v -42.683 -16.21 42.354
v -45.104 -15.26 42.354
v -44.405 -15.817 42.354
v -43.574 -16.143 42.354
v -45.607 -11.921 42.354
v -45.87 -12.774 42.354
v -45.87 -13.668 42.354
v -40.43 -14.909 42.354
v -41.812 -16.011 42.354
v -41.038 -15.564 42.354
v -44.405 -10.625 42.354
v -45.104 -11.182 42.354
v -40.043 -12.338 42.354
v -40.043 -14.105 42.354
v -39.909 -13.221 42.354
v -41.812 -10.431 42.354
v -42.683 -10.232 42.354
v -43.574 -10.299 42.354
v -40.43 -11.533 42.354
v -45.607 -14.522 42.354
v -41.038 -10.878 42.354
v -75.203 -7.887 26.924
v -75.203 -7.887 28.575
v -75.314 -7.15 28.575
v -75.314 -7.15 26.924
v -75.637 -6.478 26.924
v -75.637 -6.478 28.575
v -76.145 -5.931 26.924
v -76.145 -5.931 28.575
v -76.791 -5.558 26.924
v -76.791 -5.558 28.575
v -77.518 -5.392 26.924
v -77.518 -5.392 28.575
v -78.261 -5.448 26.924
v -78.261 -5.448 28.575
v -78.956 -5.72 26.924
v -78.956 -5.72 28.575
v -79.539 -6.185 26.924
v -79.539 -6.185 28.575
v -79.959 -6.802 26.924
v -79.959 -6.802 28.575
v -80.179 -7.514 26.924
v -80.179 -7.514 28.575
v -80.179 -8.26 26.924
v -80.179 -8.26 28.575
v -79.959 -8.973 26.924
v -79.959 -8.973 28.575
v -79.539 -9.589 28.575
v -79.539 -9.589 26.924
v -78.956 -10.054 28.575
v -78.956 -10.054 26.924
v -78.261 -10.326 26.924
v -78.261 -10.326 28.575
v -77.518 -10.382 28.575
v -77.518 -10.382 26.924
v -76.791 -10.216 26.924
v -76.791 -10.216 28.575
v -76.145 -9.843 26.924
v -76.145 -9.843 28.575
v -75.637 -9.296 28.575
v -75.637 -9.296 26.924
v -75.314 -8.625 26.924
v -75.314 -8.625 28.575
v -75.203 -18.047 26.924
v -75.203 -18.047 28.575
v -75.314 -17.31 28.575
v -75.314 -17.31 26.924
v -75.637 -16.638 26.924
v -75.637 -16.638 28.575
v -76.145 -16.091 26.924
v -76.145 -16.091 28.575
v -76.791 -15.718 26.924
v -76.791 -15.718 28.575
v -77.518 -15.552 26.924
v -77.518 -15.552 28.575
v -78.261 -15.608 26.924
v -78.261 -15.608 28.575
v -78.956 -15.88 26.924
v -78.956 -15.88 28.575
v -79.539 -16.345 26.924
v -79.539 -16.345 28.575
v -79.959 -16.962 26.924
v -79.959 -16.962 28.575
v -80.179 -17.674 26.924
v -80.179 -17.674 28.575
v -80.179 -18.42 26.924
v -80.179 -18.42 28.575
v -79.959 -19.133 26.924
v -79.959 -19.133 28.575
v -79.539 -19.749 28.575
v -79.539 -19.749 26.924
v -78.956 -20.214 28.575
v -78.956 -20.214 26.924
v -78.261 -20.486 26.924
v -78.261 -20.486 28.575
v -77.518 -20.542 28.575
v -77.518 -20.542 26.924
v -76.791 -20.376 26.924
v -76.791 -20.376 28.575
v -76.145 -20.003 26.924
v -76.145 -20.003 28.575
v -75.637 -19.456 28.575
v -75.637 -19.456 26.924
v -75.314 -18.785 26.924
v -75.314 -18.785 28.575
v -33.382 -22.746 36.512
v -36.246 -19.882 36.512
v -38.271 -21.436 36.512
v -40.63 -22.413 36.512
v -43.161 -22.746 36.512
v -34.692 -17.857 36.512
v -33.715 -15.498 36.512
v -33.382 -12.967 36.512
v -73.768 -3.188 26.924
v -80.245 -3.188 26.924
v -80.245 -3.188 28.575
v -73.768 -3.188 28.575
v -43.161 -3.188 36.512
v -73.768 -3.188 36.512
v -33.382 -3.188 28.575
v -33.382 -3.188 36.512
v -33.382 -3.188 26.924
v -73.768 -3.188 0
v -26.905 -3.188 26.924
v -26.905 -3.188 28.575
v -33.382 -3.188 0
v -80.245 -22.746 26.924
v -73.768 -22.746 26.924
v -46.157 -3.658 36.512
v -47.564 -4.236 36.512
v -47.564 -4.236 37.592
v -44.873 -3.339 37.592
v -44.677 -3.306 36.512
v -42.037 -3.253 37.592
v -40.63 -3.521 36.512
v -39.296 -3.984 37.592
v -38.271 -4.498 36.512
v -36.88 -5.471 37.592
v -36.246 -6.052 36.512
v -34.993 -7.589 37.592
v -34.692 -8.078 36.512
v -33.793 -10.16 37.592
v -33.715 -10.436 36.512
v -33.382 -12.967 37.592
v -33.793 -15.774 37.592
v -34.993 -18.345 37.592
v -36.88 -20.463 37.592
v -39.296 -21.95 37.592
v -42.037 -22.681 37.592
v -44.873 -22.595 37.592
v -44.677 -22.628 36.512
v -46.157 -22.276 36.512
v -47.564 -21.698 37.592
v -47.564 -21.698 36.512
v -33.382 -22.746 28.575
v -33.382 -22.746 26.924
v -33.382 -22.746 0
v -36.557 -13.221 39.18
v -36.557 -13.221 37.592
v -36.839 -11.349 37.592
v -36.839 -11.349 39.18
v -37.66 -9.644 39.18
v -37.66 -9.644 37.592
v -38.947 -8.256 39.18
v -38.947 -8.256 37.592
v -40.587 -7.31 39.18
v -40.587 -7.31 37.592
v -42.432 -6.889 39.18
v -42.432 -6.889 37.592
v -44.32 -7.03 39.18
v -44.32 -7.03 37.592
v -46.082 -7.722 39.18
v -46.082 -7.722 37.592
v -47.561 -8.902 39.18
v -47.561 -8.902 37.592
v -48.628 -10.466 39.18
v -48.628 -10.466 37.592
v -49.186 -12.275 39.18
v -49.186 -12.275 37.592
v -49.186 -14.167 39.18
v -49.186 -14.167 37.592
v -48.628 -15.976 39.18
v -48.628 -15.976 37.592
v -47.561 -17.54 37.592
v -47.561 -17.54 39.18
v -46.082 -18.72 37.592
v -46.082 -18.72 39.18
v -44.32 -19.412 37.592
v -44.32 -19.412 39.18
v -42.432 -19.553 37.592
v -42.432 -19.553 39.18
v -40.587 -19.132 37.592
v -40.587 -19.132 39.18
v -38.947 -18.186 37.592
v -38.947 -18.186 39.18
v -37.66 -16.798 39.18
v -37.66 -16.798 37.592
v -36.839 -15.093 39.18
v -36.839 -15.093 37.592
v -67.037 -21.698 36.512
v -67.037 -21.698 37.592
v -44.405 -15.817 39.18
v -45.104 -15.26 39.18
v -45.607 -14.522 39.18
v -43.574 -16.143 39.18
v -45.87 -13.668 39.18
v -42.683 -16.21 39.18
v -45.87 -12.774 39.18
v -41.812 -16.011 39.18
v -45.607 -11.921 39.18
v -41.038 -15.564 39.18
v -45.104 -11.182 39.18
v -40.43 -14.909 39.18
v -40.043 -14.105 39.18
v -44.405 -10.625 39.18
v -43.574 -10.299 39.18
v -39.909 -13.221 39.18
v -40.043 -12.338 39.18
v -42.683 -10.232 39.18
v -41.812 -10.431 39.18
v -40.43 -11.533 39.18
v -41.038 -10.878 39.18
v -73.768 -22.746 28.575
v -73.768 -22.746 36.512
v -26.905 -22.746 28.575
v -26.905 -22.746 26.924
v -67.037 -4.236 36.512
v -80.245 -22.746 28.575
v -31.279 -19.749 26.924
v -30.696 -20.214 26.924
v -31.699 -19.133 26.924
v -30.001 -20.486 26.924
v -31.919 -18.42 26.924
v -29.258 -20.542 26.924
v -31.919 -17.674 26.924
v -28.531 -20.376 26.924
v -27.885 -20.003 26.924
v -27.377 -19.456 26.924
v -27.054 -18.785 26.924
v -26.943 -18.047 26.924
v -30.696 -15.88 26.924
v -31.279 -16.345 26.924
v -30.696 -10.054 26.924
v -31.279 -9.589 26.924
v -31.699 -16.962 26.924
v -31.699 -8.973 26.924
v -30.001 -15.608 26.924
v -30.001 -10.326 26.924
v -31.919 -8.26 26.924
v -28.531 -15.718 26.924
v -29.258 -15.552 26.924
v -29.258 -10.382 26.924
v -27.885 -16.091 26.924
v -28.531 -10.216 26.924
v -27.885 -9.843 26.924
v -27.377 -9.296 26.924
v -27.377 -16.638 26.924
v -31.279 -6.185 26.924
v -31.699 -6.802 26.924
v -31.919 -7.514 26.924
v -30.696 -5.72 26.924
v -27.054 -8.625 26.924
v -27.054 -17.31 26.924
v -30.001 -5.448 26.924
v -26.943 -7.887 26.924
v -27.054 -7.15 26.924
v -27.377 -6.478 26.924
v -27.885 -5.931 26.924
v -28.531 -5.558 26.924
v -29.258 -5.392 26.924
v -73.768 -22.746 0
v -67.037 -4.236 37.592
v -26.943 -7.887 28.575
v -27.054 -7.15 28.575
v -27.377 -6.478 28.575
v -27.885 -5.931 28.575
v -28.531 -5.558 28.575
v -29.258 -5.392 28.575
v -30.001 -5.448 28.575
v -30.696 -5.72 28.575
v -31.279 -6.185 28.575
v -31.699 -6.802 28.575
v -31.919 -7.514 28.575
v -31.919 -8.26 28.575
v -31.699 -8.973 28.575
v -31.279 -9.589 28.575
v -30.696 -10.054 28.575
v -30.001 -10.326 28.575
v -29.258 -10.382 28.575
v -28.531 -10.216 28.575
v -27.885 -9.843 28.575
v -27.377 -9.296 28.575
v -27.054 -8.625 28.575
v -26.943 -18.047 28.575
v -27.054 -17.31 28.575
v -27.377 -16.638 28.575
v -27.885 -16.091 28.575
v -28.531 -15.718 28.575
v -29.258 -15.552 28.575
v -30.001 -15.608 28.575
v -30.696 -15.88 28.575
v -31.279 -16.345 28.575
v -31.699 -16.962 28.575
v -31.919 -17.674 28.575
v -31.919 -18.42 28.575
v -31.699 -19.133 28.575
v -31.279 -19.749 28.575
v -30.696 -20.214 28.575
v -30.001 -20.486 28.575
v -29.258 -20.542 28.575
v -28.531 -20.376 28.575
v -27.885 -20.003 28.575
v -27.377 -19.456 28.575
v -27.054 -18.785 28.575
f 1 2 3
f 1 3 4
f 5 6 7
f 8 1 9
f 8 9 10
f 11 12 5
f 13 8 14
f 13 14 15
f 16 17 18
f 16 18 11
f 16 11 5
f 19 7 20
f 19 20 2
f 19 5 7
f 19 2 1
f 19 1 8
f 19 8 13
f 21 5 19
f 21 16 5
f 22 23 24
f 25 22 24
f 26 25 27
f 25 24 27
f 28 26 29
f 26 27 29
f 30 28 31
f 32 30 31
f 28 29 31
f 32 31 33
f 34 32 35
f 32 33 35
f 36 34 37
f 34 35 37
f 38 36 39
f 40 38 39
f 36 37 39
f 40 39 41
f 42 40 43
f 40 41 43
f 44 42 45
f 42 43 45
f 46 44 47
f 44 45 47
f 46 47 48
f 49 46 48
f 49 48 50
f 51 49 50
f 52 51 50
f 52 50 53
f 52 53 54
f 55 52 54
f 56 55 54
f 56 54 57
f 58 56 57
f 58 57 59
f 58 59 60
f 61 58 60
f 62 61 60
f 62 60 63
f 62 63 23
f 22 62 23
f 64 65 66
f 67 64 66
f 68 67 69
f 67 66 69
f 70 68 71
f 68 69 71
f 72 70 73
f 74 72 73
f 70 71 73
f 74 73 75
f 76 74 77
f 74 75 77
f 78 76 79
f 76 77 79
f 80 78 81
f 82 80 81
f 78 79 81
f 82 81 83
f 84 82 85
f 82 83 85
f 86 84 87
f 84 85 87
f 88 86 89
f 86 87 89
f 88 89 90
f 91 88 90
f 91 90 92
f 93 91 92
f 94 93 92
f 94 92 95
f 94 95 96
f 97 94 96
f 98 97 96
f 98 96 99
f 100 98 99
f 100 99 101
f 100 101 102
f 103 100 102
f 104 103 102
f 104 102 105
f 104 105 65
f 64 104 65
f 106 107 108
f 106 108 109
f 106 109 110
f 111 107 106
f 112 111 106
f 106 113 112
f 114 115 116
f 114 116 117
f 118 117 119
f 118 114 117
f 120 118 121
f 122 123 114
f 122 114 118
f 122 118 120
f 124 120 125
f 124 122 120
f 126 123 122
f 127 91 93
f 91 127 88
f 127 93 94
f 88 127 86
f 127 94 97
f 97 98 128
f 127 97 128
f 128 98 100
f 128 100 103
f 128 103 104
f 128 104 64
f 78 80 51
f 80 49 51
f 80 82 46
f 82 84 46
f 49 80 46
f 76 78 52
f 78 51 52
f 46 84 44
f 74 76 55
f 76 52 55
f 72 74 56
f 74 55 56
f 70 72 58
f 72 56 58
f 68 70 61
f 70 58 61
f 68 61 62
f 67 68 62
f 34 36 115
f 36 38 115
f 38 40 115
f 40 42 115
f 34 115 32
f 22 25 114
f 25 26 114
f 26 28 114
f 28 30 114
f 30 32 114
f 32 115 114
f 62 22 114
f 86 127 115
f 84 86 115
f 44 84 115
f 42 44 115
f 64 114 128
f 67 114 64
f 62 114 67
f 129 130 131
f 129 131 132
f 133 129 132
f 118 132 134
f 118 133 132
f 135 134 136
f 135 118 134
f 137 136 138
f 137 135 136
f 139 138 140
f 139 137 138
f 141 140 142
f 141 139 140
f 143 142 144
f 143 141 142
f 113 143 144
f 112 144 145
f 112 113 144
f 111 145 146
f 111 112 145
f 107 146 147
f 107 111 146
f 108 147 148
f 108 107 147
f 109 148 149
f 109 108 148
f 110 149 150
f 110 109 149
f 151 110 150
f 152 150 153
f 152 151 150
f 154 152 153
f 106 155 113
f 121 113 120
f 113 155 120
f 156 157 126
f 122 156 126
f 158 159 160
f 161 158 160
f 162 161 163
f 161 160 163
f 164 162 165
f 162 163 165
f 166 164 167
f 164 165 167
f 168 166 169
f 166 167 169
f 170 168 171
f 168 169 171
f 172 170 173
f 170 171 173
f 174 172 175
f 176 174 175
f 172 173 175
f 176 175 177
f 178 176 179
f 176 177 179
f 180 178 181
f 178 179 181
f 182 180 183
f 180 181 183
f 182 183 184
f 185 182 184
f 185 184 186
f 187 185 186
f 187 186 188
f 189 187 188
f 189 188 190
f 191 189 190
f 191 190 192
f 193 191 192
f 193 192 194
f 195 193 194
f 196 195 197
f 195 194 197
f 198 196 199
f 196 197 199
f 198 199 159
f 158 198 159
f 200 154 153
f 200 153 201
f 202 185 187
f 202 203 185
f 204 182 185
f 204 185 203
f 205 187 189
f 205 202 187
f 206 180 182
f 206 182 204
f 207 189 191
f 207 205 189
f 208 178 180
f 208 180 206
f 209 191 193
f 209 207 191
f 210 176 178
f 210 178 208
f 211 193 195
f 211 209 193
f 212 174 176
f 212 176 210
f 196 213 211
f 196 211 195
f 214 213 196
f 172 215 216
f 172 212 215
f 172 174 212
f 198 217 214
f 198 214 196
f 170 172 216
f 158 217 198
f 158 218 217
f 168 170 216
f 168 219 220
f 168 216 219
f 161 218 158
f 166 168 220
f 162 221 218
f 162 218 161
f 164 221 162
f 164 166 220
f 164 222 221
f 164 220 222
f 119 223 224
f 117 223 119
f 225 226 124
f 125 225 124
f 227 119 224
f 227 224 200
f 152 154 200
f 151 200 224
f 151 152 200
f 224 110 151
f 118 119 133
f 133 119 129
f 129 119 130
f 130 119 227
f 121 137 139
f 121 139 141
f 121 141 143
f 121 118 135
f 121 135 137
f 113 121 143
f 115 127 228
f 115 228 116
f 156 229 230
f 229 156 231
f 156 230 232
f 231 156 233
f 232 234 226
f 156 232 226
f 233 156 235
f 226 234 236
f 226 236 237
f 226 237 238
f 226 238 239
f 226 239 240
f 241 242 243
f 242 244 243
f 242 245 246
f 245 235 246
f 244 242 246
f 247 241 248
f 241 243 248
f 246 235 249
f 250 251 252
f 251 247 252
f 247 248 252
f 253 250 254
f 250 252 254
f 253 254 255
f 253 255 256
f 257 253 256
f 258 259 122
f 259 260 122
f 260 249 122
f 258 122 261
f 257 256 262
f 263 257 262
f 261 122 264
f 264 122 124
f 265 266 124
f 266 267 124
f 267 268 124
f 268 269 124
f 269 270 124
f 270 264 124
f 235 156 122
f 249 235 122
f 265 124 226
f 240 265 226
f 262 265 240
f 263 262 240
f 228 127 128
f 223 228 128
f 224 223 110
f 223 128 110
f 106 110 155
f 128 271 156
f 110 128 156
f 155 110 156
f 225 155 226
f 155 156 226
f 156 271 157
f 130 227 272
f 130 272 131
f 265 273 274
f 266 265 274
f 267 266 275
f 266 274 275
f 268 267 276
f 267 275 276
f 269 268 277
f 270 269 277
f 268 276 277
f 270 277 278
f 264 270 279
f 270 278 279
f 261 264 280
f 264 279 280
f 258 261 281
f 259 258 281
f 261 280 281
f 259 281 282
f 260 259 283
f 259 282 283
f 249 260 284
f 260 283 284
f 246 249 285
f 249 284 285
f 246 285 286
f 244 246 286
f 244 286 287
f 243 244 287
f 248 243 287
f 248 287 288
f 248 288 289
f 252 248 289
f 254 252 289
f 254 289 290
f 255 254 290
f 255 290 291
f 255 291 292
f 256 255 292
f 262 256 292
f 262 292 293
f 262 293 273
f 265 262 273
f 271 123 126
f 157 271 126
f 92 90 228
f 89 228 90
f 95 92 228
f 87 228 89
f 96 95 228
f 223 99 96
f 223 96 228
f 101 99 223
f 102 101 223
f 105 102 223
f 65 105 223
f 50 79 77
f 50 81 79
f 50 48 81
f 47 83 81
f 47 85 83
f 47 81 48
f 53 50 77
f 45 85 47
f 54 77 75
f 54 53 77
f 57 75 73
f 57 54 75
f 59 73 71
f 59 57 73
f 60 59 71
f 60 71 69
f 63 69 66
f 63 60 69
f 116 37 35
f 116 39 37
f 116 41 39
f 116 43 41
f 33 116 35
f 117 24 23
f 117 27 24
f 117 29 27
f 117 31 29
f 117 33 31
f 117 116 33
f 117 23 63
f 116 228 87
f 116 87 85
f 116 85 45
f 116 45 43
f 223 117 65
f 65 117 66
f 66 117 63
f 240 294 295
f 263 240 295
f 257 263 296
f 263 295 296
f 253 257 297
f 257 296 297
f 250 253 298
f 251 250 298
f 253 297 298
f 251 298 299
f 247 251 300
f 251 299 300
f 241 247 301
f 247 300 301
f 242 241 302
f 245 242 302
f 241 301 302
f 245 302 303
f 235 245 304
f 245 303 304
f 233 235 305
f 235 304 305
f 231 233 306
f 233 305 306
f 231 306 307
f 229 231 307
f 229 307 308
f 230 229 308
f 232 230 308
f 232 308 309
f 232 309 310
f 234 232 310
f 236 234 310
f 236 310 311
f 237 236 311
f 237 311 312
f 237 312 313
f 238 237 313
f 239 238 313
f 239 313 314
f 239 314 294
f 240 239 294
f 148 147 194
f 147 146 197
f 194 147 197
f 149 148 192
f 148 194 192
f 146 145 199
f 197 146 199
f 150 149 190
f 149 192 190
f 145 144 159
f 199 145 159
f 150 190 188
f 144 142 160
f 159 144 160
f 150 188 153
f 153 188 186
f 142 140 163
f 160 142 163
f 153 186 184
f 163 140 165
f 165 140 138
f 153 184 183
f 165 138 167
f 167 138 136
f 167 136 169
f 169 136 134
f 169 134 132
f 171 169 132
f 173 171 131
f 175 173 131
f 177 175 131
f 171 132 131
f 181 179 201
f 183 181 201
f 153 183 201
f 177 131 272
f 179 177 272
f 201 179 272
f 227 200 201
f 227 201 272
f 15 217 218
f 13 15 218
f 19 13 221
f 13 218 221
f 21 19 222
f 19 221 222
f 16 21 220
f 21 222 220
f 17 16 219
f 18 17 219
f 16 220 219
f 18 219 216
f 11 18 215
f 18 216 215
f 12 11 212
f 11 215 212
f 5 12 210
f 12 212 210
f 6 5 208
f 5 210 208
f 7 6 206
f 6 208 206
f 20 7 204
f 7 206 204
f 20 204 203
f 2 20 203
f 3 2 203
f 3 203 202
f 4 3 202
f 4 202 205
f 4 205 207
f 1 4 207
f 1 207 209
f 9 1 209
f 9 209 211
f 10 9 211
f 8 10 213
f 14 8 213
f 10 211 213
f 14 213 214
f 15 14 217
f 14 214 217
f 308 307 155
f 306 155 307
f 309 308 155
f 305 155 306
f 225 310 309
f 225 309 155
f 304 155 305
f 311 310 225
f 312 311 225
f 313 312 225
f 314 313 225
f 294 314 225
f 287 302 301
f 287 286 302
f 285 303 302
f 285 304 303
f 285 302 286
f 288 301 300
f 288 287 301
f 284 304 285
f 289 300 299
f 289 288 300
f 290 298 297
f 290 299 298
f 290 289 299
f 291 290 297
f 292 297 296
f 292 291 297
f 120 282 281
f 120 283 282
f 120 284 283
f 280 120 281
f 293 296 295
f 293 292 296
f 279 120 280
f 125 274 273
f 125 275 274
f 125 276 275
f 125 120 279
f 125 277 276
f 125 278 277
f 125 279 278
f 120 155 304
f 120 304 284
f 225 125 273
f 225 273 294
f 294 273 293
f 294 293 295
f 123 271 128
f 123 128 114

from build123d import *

# Parameters (mm, degrees)
SKETCH3_W           = 40.386
SKETCH3_H           = 19.558
BOSS_EXTRUDE2_DEPTH = 26.924
SKETCH4_W           = 53.34
SKETCH4_H           = 19.558
BOSS_EXTRUDE3_DEPTH = 1.651
SKETCH5_R           = 2.5019
CUT_EXTRUDE1_DEPTH  = 3.175
SKETCH6_W           = 40.386
SKETCH6_H           = 19.558
BOSS_EXTRUDE4_DEPTH = 7.9375
BOSS_EXTRUDE5_DEPTH = 1.0795
SKETCH8_R           = 6.35
BOSS_EXTRUDE6_DEPTH = 1.5875
SKETCH10_R          = 2.9972
BOSS_EXTRUDE7_DEPTH = 3.175


with BuildPart() as part:
    # Sketch3 → Boss-Extrude2 (new body)
    with BuildSketch(Plane.XY):
        with Locations((-53.574618647, -12.967080077)):
            Rectangle(SKETCH3_W, SKETCH3_H)
    extrude(amount=BOSS_EXTRUDE2_DEPTH)

    # Sketch4 → Boss-Extrude3 (add)
    with BuildSketch(Plane.XY.offset(26.924)):
        with Locations((-53.574618647, -12.967080077)):
            Rectangle(SKETCH4_W, SKETCH4_H)
    extrude(amount=BOSS_EXTRUDE3_DEPTH)

    # Sketch5 → Cut-Extrude1 (cut)
    with BuildSketch(Plane.XY.offset(28.575)):
        with Locations((-77.704618647, -7.887080077)):
            Circle(SKETCH5_R)
        with Locations((-29.444618647, -7.887080077)):
            Circle(SKETCH5_R)
        with Locations((-29.444618647, -18.047080077)):
            Circle(SKETCH5_R)
        with Locations((-77.704618647, -18.047080077)):
            Circle(SKETCH5_R)
    extrude(amount=-CUT_EXTRUDE1_DEPTH, mode=Mode.SUBTRACT)

    # Sketch6 → Boss-Extrude4 (add)
    with BuildSketch(Plane.XY.offset(28.575)):
        with Locations((-53.574618647, -12.967080077)):
            Rectangle(SKETCH6_W, SKETCH6_H)
    extrude(amount=BOSS_EXTRUDE4_DEPTH)

    # Sketch7 → Boss-Extrude5 (add)
    with BuildSketch(Plane.XY.offset(36.5125)):
        with BuildLine():
            Line((-67.036618647, -21.698330077), (-67.036618647, -4.235830077))
            Line((-67.036618647, -4.235830077), (-47.564493582, -4.235830077))
            ThreePointArc((-47.564493582, -4.235830077), (-33.381618647, -12.967080077), (-47.564493582, -21.698330077))
            Line((-47.564493582, -21.698330077), (-67.036618647, -21.698330077))
        make_face()
    extrude(amount=BOSS_EXTRUDE5_DEPTH)

    # Sketch8 → Boss-Extrude6 (add)
    with BuildSketch(Plane.XY.offset(37.592)):
        with Locations((-42.906618647, -13.221080077)):
            Circle(SKETCH8_R)
    extrude(amount=BOSS_EXTRUDE6_DEPTH)

    # Sketch10 → Boss-Extrude7 (add)
    with BuildSketch(Plane.XY.offset(39.1795)):
        with Locations((-42.906618647, -13.221080077)):
            Circle(SKETCH10_R)
    extrude(amount=BOSS_EXTRUDE7_DEPTH)


solid = part.part
